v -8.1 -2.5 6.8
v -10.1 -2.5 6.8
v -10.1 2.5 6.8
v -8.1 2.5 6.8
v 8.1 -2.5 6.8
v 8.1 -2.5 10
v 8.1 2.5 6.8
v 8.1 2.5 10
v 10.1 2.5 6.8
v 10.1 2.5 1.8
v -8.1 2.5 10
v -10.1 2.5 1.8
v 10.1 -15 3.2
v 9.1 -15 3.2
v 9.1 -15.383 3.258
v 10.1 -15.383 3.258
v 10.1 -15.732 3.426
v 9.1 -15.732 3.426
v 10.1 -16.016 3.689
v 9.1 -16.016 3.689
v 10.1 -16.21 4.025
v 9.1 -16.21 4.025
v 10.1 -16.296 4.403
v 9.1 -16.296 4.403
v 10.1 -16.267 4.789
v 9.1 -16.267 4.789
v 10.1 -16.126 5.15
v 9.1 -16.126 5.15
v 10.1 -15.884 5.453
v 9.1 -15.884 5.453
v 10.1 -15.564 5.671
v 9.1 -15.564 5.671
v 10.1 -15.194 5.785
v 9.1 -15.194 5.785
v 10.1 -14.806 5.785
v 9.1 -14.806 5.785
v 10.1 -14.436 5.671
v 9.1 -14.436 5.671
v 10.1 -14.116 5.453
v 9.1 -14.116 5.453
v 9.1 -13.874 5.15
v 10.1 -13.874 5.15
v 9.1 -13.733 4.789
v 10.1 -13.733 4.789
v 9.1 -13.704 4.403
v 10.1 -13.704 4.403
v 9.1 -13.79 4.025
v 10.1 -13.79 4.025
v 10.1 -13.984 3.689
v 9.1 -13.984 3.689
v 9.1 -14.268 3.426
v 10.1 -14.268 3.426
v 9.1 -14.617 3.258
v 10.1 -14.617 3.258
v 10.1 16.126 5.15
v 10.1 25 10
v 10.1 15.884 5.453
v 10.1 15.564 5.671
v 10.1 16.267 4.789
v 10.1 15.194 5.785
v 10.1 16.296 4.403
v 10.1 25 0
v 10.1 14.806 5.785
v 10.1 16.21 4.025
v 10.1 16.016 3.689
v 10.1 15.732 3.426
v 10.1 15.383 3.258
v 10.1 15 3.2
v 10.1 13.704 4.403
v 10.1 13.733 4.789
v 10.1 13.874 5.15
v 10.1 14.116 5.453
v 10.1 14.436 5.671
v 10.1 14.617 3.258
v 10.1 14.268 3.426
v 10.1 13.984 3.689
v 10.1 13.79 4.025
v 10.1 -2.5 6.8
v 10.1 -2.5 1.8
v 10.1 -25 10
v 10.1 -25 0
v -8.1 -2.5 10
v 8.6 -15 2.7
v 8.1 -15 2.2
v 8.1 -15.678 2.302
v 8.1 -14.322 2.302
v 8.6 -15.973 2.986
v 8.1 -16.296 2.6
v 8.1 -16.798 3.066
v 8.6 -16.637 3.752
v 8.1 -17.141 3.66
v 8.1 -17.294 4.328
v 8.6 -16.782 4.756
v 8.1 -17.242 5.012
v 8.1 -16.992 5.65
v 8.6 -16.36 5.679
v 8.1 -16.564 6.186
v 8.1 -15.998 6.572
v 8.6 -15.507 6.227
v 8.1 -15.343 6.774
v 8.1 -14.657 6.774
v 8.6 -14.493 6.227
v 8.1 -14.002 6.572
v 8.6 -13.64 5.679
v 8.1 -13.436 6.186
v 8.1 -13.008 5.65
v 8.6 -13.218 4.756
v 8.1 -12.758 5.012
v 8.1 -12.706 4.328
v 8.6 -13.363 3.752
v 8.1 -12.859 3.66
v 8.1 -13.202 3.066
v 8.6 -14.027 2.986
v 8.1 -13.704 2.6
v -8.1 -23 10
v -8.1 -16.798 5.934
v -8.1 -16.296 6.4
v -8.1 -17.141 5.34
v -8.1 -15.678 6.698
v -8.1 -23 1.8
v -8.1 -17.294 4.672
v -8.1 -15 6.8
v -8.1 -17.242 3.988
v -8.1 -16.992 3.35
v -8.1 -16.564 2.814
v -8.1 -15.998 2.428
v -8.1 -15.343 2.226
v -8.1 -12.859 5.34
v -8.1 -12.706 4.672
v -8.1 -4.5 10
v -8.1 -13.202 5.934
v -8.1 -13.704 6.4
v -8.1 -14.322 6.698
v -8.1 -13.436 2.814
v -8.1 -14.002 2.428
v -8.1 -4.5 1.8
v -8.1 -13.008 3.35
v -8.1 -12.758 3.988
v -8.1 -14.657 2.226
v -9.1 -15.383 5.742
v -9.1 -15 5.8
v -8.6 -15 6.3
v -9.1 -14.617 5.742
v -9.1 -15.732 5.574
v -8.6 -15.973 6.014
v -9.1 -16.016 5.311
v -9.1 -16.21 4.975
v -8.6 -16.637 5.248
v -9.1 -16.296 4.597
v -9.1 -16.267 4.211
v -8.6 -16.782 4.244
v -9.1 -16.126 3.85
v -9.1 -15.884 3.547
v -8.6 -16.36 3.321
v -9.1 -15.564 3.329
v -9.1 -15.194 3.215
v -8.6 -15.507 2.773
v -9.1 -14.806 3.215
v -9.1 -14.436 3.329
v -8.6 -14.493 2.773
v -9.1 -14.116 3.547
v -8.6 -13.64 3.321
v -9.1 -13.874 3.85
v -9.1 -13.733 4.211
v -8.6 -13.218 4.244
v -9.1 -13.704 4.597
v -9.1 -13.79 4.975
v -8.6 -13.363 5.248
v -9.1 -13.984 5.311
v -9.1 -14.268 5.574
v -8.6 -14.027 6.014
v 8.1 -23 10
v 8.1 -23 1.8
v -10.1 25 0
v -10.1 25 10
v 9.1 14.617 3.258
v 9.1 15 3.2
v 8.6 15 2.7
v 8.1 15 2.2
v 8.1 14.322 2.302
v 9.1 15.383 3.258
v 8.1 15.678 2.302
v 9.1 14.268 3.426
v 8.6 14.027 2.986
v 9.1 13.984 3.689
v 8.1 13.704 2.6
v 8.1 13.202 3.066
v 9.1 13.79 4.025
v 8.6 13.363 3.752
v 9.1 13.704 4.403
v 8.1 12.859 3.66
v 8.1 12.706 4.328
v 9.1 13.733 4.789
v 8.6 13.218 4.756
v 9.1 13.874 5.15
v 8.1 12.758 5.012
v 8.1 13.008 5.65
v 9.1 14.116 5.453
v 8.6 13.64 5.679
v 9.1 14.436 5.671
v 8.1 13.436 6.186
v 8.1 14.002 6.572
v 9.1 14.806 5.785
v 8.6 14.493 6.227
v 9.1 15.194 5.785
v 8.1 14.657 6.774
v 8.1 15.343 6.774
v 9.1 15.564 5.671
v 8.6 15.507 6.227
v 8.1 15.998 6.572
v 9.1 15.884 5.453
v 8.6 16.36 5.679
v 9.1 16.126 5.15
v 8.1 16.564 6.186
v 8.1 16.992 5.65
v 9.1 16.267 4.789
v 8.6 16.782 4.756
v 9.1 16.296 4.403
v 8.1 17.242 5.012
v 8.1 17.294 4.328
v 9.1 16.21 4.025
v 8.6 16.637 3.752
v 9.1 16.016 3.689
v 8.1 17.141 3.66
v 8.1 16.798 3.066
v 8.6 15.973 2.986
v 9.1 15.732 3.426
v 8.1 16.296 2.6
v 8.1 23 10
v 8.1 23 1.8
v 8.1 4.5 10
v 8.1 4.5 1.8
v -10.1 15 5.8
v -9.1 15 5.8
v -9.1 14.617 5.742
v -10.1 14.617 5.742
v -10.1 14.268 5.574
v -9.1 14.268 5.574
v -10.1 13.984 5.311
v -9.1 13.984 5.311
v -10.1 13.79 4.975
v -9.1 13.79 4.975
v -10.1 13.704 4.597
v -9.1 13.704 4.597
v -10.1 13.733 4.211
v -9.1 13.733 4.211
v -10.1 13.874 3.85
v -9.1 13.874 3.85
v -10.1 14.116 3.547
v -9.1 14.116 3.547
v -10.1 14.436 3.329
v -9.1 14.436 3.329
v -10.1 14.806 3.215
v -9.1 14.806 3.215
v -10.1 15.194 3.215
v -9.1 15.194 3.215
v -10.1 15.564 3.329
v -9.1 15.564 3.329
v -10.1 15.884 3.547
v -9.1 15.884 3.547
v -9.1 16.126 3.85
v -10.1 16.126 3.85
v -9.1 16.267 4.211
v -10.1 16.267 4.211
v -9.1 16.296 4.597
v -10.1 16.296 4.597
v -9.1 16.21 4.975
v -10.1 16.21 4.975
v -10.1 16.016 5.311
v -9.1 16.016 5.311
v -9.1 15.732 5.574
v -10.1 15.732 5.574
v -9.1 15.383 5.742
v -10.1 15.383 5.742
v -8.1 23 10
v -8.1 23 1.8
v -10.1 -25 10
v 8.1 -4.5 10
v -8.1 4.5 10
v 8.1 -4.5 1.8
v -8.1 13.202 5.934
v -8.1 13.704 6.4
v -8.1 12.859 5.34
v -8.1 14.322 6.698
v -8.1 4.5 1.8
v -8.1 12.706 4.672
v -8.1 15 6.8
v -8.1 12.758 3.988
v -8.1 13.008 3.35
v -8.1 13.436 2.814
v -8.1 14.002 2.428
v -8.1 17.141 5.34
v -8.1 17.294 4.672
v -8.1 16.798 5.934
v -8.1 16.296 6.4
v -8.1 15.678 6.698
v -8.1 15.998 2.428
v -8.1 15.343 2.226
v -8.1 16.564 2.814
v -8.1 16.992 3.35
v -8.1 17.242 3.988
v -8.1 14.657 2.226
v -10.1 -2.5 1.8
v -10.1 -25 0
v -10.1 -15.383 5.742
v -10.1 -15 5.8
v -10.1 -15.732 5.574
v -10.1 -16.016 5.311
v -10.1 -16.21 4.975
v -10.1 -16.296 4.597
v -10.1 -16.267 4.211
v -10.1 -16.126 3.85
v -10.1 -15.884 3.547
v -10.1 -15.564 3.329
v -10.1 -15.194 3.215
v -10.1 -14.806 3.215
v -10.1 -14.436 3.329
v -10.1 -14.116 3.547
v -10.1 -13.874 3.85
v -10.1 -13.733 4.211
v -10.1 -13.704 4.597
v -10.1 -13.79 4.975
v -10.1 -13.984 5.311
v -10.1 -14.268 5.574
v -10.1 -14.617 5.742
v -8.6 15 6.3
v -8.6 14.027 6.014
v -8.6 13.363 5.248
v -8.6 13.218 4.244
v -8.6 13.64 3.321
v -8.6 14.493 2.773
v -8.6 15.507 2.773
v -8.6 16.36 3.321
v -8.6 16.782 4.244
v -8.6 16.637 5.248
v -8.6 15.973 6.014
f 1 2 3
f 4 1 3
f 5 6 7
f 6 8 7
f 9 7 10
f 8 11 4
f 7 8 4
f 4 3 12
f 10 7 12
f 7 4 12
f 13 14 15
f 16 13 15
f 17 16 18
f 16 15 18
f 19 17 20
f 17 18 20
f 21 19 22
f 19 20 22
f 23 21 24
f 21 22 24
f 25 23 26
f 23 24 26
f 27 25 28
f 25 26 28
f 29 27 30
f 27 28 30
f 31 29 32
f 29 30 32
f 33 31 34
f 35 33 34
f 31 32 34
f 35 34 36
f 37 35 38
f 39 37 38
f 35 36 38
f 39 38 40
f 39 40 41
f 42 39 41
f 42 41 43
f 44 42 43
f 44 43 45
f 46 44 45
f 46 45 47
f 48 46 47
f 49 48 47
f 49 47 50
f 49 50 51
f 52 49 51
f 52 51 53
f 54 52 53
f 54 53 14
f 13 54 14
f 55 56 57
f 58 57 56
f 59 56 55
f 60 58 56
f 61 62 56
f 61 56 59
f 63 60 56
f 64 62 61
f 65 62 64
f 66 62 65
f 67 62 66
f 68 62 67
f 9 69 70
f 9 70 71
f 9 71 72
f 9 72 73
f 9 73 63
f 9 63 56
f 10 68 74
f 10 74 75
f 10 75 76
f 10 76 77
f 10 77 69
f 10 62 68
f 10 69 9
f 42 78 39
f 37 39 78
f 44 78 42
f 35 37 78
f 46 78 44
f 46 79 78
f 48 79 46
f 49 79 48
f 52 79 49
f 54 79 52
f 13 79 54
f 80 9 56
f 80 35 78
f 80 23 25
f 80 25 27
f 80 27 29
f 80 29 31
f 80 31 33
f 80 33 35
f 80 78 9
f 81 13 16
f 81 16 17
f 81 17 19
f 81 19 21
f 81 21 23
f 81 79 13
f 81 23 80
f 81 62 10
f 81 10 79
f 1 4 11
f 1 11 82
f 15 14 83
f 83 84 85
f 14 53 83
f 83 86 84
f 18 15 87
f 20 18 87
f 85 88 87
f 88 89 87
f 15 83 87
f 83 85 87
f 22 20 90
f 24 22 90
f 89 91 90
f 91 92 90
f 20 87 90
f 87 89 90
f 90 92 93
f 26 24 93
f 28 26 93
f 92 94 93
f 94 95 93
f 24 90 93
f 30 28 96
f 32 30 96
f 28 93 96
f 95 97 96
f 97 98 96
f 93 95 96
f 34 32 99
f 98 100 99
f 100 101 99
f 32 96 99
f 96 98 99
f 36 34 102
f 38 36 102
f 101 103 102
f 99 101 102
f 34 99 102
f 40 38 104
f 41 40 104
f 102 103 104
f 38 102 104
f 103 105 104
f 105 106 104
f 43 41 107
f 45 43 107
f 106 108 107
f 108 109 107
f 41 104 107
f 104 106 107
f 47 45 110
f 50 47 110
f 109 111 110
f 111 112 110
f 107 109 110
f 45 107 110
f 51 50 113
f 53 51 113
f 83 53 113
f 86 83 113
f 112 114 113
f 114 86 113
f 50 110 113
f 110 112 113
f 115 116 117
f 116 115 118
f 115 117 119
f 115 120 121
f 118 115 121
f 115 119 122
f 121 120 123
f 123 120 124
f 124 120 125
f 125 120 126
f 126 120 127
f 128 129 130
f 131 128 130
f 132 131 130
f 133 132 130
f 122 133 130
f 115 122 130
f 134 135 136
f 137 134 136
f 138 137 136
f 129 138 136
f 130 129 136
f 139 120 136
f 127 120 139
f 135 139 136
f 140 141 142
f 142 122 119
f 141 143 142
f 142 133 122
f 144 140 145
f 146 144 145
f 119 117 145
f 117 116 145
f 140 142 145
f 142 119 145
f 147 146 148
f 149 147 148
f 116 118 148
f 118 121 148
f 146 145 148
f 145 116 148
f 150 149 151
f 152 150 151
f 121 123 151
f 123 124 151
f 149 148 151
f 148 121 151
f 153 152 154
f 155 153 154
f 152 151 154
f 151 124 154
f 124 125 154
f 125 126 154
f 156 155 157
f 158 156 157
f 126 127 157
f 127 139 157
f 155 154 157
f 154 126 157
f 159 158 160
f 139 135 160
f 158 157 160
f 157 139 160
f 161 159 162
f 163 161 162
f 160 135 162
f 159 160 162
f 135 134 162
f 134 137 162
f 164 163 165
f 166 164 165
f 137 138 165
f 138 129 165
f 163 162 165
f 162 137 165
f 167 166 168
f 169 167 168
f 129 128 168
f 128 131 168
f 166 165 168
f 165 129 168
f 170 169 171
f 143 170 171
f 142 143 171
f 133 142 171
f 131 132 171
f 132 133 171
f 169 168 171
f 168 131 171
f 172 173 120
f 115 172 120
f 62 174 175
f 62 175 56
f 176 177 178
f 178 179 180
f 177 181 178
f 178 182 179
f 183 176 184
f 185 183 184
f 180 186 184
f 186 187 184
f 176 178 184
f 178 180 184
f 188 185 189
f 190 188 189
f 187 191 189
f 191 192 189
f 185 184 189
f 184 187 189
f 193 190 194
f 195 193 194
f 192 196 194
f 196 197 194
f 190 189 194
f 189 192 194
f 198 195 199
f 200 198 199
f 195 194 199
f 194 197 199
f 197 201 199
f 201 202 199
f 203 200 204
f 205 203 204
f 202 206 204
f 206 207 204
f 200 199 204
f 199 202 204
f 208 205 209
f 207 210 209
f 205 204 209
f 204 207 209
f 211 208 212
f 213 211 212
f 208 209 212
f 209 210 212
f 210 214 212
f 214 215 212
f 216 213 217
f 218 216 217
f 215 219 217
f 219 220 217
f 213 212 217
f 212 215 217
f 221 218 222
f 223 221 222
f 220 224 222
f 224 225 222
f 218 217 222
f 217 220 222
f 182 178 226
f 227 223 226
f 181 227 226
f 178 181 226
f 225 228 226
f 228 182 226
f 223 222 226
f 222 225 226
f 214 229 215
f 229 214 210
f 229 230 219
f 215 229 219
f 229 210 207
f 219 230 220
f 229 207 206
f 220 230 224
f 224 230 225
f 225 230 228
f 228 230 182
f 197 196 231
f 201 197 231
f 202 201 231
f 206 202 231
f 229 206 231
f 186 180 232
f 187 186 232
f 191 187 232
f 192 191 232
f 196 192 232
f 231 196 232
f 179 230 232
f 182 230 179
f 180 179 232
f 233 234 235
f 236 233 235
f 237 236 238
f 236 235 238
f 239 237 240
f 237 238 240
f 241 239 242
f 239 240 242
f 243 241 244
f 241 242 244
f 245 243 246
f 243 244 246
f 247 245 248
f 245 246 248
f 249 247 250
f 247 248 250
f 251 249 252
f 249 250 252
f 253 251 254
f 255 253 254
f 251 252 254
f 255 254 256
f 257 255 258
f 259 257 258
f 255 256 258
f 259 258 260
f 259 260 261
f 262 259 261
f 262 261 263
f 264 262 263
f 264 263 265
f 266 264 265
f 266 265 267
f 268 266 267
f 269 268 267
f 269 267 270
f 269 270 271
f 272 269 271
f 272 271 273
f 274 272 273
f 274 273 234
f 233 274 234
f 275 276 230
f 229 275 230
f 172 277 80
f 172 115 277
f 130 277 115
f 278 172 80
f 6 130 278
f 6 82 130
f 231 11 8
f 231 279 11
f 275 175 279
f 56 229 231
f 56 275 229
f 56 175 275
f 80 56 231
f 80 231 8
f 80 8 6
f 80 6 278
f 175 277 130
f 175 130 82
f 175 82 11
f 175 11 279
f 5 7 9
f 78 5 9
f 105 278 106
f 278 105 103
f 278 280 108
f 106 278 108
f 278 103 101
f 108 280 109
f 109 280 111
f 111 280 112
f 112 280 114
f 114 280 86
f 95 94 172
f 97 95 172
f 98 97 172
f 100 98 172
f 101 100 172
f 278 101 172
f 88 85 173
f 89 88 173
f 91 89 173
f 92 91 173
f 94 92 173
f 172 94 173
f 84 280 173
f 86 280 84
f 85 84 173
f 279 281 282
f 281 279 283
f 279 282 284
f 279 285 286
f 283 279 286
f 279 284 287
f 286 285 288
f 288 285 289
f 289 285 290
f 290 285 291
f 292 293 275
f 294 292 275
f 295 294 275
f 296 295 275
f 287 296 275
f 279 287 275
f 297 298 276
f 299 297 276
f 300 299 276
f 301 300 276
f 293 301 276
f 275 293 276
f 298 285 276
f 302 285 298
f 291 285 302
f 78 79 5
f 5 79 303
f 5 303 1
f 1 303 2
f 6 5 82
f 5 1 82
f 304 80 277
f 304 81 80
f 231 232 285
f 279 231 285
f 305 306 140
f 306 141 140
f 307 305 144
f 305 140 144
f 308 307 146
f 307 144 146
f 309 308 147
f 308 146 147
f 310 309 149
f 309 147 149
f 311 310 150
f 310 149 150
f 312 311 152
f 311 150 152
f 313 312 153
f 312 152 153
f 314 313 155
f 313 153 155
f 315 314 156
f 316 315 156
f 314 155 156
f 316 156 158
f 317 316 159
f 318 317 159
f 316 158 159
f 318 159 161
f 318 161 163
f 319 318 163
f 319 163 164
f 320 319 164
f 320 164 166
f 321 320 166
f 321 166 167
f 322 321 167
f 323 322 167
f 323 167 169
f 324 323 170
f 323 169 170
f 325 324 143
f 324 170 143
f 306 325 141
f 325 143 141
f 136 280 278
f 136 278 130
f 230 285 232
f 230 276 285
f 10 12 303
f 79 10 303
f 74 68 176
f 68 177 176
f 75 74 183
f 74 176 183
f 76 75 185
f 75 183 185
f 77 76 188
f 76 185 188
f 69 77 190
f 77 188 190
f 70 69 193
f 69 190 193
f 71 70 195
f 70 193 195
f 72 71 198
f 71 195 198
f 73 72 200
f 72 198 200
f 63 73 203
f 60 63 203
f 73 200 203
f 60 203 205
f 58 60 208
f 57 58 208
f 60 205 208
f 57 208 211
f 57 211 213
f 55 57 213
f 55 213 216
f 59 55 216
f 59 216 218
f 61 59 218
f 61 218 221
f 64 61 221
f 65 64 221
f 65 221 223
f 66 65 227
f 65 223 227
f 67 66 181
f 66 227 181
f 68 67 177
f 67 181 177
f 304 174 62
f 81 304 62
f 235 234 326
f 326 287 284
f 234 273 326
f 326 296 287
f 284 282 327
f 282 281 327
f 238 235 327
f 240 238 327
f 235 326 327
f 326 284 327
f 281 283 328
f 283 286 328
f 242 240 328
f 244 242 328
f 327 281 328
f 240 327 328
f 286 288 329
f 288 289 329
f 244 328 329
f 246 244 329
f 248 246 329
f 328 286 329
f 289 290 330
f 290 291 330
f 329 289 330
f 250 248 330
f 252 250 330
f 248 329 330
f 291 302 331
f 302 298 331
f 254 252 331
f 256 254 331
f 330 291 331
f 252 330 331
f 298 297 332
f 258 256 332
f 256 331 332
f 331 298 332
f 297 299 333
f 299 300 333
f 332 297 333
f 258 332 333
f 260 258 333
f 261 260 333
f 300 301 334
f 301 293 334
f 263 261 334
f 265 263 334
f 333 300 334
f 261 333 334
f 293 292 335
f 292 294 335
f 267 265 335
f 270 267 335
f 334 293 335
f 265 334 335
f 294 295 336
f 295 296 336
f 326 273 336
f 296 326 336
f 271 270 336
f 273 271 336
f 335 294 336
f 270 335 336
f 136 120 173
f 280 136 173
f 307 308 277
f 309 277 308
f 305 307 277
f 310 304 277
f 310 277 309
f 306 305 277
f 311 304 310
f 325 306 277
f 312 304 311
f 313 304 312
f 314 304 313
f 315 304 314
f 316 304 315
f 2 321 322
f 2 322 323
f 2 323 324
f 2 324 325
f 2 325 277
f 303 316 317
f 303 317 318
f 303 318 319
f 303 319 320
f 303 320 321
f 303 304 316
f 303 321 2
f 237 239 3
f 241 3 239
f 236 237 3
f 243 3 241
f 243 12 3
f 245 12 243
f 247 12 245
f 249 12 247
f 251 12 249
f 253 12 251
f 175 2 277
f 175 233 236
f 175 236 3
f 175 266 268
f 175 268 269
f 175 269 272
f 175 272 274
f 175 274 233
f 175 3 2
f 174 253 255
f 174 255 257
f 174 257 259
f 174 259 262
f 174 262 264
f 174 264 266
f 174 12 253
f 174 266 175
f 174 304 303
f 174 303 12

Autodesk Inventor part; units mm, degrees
ref_plane "YZ Plane" through (0, 0, 0) normal (1, 0, 0) x (0, 1, 0)
ref_plane "XZ Plane" through (0, 0, 0) normal (0, 1, 0) x (-1, 0, 0)
ref_plane "XY Plane" through (0, 0, 0) normal (0, 0, 1) x (1, 0, 0)
sketch "Sketch3" plane through (0, 0, 0) normal (0, 0, 1) x (1, 0, 0)
  line L0 (-10.1, 25) -> (10.1, 25)
  line L1 (10.1, 25) -> (10.1, -25)
  line L2 (10.1, -25) -> (-10.1, -25)
  line L3 (-10.1, -25) -> (-10.1, 25)
  point P0 (0, 0)
  dimension "d26" = 20.2
  dimension "d27" = 50
extrude "Extrusion3" add sketch "Sketch3" along normal blind 1.8
sketch "Sketch4" plane through (0, 0, 1.8) normal (0, 0, 1) x (1, 0, 0)
  line L0 (-8.1, 23) -> (8.1, 23)
  line L1 (8.1, -23) -> (-8.1, -23)
  line L2 (-8.1, 0) -> (-8.1, 2.5)
  line L3 (-8.1, 2.5) -> (8.1, 2.5)
  line L4 (8.1, 4.5) -> (-8.1, 4.5)
  line L5 (-8.1, 0) -> (-8.1, -2.5)
  line L6 (-8.1, -2.5) -> (8.1, -2.5)
  line L7 (8.1, -4.5) -> (-8.1, -4.5)
  line L8 (-8.1, 4.5) -> (-8.1, 23)
  line L9 (8.1, 23) -> (8.1, 4.5)
  line L10 (8.1, 2.5) -> (8.1, -2.5)
  line L11 (8.1, -4.5) -> (8.1, -23)
  line L12 (-10.1, 25) -> (-10.1, -25) projected
  line L13 (10.1, -25) -> (10.1, 25) projected
  line L14 (-10.1, 25) -> (10.1, 25)
  line L15 (10.1, 25) -> (10.1, -25)
  line L16 (10.1, -25) -> (-10.1, -25)
  line L17 (-10.1, -25) -> (-10.1, 25)
  line L18 (-8.1, -23) -> (-8.1, -4.5)
  line L19 (-8.1, -2.5) -> (-8.1, 2.5)
  point P0 (0, 0)
  dimension "d39" = 2.5
  dimension "d40" = 2.5
  dimension "d44" = 2
  dimension "d45" = 2
  dimension "d48" = 2
  dimension "d49" = 2
  dimension "d50" = 2
  dimension "d51" = 2
  dimension "d52" = 2
  dimension "d53" = 2
  dimension "d56" = 2
  dimension "d57" = 2
extrude "Extrusion4" add sketch "Sketch4" along normal blind 8.2
sketch "Sketch5" plane through (10.1, -25, 0) normal (1, 0, 0) x (0, 0, -1)
  line L0 (-1.8, 27.5) -> (-10, 27.5) projected
  line L1 (-1.8, 22.5) -> (-10, 22.5) projected
  line L2 (-10, 27.5) -> (-1.8, 27.5)
  line L3 (-1.8, 27.5) -> (-1.8, 22.5)
  line L4 (-1.8, 22.5) -> (-10, 22.5)
  line L5 (-10, 22.5) -> (-10, 27.5)
  point P0 (0, 25)
extrude "Extrusion5" cut sketch "Sketch5" against normal blind 8.2
sketch "Sketch6" plane through (-10.1, -25, 0) normal (-1, 0, 0) x (0, 0, 1)
  line L0 (1.8, 27.5) -> (1.8, 22.5) projected
  line L1 (1.8, 22.5) -> (6.8, 22.5)
  line L2 (6.8, 22.5) -> (6.8, 27.5)
  line L3 (6.8, 27.5) -> (1.8, 27.5)
  line L4 (1.8, 27.5) -> (1.8, 22.5)
  point P0 (0, 25)
  dimension "d60" = 5
  dimension "d61" = 5
extrude "Extrusion6" cut sketch "Sketch6" against normal blind 8.2
sketch "Sketch7" plane through (-10.1, -25, 0) normal (-1, 0, 0) x (0, 0, 1)
  line L0 (0, 50) -> (10, 50) projected
  line L1 (0, 0) -> (0, 50) projected
  line L2 (0, 0) -> (10, 0)
  line L3 (10, 50) -> (10, 0) projected
  line L4 (10, 29.5) -> (10, 48) projected
  line L5 (10, 20.5) -> (10, 2) projected
  point P0 (0, 25)
  point P1 (4.5, 40)
  point P2 (4.5, 10)
  dimension "d66" = 10
  dimension "d67" = 4.5
hole "Hole1" at (-10.1, 15, 4.5) at (-10.1, -15, 4.5) direction (1, 0, 0) diameter 2.6 depth 2 tip angle 118
chamfer "Chamfer3" distance 1 angle 45 2 edges at (-8.1, -15, 3.2) (-8.1, 15, 3.2)
sketch "Sketch10" plane through (10.1, -25, 0) normal (1, 0, 0) x (0, 0, -1)
  circle A0 centre (-4.5, 40) radius 2.3 projected
  circle A1 centre (-4.5, 10) radius 2.3 projected
  point P0 (0, 25)
hole "Hole6" at (10.1, -15, 4.5) at (10.1, 15, 4.5) direction (-1, 0, 0) diameter 2.6 depth 2 tip angle 118
sketch "Sketch11" plane through (-10.1, 2.5, 1.8) normal (0, -1, 0) x (1, 0, 0)
  line L0 (2, 8.2) -> (20.2, 8.2) projected
  line L1 (20.2, 8.2) -> (18.2, 8.2)
  line L2 (18.2, 8.2) -> (18.2, 5)
  line L3 (18.2, 5) -> (20.2, 5)
  line L4 (20.2, 5) -> (20.2, 8.2)
  point P0 (10.1, -1.8)
  dimension "d141" = 2
  dimension "d142" = 3.2
extrude "Extrusion9" add sketch "Sketch11" along normal blind 10
chamfer "Chamfer4" distance 1 angle 45 2 edges at (8.1, 15, 5.8) (8.1, -15, 5.8)
properties part number "digit_holder_C"
